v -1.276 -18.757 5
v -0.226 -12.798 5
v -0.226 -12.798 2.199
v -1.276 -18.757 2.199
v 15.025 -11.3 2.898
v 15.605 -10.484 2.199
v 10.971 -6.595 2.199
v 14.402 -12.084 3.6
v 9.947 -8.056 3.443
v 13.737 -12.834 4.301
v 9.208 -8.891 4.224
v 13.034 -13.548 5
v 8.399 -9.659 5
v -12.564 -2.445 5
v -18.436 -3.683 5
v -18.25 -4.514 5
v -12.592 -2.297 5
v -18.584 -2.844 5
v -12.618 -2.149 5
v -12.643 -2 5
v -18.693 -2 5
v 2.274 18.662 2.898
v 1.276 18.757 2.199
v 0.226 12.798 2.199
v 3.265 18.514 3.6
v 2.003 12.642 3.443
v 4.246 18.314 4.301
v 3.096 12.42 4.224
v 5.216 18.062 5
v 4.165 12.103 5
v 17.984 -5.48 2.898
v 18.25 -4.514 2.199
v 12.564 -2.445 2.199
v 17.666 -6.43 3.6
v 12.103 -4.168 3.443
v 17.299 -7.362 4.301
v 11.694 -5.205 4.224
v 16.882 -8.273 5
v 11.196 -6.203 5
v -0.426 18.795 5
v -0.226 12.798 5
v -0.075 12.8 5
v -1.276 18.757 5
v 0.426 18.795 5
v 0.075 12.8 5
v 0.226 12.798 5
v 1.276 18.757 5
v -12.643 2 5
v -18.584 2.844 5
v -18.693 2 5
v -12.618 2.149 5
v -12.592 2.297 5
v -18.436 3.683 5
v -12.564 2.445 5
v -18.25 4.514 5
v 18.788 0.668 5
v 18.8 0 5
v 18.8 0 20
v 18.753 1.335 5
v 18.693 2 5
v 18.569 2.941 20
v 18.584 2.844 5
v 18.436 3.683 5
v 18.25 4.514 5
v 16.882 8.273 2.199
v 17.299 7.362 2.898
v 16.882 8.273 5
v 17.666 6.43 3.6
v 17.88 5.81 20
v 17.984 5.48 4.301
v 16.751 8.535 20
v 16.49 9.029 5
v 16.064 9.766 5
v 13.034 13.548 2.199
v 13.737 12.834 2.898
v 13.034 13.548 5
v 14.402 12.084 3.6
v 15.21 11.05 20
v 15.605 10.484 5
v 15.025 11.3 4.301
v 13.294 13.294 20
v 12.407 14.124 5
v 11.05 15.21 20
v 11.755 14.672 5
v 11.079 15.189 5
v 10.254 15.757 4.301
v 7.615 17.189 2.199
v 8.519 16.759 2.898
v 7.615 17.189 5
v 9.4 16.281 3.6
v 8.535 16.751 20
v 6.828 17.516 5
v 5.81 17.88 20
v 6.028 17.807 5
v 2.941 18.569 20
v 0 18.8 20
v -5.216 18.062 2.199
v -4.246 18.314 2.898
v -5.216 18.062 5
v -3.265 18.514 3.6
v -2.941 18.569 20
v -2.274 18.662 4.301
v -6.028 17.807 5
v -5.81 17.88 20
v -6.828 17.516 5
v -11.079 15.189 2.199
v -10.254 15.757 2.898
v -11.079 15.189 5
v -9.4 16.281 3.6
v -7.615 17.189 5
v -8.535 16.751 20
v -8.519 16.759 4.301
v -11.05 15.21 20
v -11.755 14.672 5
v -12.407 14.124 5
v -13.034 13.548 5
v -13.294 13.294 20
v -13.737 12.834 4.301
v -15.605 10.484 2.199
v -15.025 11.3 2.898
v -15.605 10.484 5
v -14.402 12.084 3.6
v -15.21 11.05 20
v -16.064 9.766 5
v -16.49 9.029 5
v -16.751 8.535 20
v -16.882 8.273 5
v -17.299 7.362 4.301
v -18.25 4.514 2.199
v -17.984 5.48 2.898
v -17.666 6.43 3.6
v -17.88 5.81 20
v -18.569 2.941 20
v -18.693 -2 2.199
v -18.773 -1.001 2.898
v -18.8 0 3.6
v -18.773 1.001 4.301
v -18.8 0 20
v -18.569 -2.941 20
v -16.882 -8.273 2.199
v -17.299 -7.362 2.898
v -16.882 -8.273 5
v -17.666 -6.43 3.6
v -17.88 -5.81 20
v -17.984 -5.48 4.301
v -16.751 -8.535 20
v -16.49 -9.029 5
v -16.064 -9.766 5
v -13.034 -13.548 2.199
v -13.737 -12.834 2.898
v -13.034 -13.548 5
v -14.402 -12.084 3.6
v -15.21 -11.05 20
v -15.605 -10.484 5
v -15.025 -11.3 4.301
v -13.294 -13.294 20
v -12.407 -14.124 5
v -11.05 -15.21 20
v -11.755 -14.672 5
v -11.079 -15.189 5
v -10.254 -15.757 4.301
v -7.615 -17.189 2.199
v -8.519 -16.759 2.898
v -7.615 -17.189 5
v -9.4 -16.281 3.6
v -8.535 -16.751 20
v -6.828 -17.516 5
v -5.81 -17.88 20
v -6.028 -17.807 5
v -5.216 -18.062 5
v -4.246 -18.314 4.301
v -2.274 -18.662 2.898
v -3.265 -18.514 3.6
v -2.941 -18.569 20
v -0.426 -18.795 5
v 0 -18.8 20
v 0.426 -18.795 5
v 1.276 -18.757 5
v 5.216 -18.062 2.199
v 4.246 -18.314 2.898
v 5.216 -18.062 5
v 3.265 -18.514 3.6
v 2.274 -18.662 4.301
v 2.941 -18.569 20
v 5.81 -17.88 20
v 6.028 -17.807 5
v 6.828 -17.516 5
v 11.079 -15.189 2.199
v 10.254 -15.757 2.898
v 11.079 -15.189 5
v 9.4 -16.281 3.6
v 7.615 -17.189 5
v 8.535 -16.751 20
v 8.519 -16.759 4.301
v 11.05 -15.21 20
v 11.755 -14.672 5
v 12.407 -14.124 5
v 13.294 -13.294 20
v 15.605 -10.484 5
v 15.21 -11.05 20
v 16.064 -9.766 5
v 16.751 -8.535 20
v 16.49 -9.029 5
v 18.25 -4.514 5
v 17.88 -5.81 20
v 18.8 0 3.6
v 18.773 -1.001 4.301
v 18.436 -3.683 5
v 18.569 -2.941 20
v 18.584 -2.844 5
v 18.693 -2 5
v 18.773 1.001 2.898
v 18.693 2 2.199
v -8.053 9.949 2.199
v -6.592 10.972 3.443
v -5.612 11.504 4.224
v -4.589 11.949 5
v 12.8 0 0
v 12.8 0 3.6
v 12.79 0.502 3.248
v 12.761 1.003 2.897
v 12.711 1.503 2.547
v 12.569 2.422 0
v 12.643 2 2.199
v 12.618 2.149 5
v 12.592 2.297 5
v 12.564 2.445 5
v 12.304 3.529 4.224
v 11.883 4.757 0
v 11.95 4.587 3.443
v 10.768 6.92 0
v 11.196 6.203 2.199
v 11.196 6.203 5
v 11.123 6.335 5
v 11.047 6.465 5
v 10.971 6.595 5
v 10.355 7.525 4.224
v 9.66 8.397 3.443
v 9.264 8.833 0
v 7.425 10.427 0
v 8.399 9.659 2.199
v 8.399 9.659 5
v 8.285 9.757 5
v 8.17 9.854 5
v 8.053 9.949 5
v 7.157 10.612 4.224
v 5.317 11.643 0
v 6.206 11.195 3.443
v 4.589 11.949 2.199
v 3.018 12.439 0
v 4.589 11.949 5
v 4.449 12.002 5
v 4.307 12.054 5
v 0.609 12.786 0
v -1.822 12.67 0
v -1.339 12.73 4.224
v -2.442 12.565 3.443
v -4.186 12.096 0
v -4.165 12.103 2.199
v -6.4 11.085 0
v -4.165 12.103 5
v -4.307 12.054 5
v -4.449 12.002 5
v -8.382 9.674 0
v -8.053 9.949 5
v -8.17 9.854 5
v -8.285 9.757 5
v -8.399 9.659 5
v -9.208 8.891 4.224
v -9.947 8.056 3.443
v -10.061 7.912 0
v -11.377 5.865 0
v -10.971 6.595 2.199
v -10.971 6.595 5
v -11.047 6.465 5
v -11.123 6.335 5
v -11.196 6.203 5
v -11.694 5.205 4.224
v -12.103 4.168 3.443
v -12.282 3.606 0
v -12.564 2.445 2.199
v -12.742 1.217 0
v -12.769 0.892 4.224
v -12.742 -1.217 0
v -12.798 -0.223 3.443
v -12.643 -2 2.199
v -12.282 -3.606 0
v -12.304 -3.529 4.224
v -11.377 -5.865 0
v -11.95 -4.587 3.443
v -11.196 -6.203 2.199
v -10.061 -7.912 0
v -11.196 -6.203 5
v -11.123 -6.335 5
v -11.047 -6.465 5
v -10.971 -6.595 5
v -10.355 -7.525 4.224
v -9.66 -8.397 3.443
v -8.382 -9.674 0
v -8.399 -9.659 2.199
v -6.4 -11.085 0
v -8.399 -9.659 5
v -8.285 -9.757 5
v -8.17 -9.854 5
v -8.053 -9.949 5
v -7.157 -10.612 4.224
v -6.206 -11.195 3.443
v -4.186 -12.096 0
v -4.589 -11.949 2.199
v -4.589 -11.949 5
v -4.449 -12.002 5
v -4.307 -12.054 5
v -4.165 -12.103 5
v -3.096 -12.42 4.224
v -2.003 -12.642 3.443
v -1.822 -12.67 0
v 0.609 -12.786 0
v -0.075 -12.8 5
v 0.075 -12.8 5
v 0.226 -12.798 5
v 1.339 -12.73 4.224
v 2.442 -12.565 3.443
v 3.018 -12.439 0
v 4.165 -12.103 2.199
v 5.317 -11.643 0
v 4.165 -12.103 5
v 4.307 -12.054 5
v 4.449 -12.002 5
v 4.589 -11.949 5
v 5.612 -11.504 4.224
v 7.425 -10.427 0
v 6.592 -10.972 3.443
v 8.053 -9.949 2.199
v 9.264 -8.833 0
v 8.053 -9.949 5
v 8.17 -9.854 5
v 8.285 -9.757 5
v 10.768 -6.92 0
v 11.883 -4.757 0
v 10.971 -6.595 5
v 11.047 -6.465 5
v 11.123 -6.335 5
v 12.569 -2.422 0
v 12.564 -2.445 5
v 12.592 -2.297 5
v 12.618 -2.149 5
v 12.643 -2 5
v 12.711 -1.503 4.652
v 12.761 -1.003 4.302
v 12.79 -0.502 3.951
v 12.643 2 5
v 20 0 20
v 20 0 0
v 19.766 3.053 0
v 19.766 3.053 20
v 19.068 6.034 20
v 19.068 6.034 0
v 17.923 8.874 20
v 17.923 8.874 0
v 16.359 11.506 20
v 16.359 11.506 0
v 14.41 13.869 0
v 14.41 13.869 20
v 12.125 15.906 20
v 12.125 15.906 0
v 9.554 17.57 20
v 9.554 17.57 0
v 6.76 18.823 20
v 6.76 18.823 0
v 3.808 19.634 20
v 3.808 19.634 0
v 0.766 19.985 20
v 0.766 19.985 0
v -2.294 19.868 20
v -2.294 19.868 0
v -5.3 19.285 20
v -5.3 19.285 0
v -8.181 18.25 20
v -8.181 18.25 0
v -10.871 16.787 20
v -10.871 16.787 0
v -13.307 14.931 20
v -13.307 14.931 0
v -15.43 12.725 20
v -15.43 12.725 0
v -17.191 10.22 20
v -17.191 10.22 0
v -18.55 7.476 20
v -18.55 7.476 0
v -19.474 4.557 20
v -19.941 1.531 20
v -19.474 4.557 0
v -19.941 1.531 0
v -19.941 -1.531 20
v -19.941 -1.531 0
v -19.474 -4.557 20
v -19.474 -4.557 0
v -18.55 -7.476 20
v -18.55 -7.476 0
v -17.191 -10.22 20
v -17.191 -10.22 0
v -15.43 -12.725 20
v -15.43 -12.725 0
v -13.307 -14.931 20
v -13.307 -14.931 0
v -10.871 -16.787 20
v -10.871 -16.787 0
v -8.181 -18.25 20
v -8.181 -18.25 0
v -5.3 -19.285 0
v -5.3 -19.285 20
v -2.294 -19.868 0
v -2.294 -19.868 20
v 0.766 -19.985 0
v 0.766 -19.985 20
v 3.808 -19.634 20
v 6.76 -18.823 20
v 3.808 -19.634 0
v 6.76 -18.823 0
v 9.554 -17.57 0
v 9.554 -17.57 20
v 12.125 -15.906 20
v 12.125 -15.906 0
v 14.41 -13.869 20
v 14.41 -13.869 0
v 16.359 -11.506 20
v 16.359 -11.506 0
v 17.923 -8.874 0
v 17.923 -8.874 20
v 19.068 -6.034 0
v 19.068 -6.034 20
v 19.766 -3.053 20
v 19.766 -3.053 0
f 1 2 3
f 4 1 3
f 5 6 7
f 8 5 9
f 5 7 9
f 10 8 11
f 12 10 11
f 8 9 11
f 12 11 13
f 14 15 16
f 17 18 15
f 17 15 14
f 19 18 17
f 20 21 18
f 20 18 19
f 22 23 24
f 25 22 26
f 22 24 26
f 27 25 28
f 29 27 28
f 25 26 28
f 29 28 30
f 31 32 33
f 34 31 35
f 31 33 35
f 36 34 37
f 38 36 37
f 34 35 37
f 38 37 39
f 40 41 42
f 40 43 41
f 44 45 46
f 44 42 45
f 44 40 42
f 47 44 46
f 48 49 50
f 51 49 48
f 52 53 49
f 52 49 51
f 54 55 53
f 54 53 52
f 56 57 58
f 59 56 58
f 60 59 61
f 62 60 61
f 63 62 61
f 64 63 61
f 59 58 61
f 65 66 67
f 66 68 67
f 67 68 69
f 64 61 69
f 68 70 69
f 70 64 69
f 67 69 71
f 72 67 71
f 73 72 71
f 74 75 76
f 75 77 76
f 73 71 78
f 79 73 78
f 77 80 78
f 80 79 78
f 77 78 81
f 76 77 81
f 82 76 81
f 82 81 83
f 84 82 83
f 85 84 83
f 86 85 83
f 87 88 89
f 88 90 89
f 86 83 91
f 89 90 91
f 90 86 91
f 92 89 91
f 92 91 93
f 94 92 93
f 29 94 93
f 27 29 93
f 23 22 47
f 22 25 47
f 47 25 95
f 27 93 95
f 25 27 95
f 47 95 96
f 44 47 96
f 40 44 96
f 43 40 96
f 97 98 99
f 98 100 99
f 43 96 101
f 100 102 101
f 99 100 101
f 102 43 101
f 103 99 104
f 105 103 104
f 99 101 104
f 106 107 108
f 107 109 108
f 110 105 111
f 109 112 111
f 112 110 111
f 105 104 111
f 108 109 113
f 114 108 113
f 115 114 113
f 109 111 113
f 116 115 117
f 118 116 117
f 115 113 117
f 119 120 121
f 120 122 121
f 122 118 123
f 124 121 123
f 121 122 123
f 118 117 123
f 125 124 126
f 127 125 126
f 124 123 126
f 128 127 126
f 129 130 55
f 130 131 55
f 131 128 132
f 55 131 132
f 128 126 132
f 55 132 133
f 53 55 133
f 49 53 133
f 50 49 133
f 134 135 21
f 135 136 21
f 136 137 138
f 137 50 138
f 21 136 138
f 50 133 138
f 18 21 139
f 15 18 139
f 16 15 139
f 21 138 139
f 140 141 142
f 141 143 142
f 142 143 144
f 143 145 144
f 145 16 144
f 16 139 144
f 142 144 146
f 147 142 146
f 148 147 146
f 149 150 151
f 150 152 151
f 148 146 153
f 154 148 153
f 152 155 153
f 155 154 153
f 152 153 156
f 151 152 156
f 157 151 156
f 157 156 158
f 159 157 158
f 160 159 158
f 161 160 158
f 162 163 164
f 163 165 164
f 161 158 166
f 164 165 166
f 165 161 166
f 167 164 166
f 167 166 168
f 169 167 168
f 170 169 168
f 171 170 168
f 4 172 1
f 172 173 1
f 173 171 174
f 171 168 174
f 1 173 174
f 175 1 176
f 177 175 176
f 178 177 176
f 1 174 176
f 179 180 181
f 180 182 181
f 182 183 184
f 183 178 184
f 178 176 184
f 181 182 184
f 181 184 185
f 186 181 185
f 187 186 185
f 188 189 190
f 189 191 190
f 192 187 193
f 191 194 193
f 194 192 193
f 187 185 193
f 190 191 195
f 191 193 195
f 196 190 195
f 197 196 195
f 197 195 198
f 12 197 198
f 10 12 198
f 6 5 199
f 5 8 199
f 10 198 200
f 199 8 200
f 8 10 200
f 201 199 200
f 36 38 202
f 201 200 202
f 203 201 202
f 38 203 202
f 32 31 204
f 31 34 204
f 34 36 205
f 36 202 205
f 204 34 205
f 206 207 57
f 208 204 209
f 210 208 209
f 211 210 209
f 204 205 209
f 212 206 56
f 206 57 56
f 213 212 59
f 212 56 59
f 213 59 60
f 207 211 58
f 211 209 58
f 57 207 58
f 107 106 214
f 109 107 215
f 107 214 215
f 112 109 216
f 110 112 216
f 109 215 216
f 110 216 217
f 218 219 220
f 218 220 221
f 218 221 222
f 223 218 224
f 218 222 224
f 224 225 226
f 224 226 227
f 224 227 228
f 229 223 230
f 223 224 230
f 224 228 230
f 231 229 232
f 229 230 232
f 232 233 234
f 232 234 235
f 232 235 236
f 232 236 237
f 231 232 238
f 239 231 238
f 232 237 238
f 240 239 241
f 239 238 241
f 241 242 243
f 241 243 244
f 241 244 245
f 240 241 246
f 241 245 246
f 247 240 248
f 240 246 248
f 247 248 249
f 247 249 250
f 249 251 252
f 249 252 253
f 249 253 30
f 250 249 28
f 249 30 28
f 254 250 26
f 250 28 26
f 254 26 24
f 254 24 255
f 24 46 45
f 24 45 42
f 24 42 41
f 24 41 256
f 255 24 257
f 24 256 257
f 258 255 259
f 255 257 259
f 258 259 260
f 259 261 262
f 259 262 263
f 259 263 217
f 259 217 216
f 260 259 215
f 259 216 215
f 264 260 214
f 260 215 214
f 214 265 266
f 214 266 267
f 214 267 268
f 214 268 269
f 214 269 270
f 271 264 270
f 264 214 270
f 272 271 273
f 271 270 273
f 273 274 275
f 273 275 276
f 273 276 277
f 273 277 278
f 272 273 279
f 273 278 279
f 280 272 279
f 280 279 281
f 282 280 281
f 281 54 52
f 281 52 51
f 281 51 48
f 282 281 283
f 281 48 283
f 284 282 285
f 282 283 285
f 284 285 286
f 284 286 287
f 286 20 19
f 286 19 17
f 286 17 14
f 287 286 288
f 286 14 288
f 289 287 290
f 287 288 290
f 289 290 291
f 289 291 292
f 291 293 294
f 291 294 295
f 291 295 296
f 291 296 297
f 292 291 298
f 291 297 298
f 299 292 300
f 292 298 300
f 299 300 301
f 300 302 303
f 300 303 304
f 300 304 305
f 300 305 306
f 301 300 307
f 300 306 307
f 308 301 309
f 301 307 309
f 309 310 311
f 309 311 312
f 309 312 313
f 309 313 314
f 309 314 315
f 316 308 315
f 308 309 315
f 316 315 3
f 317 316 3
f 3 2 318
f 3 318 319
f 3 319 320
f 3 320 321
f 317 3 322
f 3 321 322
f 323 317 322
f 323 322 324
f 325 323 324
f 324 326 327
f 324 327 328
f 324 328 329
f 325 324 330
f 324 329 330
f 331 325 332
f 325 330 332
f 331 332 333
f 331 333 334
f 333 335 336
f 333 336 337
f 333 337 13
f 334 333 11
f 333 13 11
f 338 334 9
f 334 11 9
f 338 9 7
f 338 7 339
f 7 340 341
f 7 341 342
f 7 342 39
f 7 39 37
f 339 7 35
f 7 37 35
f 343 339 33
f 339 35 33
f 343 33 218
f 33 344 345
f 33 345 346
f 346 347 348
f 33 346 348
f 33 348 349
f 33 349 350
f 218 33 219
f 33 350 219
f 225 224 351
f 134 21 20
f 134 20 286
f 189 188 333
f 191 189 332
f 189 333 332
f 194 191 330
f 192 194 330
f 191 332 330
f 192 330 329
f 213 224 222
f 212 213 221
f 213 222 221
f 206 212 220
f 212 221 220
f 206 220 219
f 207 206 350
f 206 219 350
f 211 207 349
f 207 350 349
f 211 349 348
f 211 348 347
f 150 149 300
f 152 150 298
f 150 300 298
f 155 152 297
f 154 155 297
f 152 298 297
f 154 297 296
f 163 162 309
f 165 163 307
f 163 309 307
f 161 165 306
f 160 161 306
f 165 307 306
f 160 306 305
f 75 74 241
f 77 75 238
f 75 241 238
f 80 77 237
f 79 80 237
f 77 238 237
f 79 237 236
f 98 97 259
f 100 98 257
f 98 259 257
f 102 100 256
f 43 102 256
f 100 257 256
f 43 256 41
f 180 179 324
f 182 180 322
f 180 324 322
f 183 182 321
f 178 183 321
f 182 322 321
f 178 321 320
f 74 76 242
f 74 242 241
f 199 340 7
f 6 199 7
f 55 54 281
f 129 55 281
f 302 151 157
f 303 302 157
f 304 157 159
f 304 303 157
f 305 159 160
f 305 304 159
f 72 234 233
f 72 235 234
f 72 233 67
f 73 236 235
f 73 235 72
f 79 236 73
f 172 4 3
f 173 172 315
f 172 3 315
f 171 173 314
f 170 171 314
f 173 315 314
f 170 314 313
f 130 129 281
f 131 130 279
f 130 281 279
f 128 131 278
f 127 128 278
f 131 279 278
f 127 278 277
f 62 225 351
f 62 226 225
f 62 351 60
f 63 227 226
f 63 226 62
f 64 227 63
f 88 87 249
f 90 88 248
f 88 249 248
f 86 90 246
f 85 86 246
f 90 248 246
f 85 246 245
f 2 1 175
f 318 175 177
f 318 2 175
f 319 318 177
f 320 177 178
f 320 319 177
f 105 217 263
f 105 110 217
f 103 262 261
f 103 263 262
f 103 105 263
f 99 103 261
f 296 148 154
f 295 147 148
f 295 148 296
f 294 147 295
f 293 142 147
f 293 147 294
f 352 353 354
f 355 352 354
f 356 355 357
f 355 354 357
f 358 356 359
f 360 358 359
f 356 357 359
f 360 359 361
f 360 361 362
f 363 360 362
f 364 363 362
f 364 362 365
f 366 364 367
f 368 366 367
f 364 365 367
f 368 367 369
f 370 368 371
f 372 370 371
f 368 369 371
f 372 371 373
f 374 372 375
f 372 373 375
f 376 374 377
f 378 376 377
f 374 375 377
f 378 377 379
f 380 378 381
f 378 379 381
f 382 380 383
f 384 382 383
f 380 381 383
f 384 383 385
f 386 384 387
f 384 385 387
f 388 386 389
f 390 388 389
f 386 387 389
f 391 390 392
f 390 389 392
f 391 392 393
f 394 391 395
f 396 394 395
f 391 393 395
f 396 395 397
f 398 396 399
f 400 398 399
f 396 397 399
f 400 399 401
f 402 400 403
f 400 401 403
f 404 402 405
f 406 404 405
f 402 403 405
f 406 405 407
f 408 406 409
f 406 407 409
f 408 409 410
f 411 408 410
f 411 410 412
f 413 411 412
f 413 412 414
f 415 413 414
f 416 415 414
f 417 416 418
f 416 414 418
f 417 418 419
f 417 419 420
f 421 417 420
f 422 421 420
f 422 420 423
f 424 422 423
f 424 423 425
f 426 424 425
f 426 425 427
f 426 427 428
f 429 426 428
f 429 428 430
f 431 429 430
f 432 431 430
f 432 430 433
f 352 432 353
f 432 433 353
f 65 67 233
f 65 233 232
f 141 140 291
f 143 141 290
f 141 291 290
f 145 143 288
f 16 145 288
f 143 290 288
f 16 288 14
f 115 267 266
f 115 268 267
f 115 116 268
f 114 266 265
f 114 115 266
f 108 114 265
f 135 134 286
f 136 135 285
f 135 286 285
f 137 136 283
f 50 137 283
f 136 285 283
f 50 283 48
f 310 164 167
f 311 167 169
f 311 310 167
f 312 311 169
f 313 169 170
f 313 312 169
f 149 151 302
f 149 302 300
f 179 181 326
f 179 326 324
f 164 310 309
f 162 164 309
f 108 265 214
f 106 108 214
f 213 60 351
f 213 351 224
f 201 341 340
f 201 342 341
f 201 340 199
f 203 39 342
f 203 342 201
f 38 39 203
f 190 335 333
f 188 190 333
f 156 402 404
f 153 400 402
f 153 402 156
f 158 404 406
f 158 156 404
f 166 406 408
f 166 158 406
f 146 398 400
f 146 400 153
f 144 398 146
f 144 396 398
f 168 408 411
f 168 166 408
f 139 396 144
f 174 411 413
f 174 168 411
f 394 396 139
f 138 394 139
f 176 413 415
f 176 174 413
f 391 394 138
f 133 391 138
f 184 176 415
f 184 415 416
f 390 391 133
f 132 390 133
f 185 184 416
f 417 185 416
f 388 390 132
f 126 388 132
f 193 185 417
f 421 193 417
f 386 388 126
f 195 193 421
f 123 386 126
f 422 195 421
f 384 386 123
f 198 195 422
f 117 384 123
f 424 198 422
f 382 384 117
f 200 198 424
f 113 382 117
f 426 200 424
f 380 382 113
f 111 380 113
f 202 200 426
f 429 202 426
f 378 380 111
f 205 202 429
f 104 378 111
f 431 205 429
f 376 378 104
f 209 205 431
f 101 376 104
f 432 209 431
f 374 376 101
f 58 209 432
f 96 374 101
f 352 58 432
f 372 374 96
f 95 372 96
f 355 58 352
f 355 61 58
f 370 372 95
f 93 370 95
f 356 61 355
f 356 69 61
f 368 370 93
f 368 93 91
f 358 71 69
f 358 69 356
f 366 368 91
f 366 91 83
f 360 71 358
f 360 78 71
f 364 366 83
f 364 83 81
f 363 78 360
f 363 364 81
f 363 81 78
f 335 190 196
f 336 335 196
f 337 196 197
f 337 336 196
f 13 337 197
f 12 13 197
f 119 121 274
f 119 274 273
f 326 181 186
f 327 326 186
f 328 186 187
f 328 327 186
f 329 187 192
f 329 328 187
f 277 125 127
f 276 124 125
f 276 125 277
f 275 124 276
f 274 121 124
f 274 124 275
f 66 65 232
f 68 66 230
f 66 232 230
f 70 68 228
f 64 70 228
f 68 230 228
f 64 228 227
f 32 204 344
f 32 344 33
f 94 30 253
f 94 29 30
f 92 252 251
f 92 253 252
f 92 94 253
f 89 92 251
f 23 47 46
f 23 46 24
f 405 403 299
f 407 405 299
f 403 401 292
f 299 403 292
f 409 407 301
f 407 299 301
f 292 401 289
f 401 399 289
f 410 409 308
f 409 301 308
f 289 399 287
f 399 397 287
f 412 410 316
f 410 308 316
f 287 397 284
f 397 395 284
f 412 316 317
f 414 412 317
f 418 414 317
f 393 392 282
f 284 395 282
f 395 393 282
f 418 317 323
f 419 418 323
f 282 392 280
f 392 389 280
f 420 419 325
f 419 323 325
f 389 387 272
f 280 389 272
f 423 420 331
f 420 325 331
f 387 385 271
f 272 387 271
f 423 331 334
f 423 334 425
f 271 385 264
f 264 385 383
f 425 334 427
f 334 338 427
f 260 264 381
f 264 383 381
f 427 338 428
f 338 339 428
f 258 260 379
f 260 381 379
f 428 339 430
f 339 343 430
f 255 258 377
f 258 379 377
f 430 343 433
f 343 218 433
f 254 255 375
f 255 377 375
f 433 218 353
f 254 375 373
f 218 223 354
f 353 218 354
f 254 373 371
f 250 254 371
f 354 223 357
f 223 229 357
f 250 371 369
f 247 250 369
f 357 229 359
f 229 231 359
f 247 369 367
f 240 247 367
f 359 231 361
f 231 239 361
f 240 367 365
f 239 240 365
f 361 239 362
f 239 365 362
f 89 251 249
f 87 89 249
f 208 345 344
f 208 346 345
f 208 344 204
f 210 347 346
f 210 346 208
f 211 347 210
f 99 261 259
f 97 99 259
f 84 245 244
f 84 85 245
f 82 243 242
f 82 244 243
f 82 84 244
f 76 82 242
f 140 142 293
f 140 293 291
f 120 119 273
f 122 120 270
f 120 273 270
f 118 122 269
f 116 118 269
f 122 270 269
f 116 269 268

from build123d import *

# Parameters (mm, degrees)
F0_R            = 20
F1_DEPTH        = 20
F2_R            = 18.8
F3_DEPTH        = 15
F4_R            = 12.8
F5_DEPTH        = 25
F7_END_RADIUS   = 18.8
F7_REACH        = 24.884098355
F7_COPIES_COUNT = 18


# Not quite as in the source:
# - a pattern or mirror of a feature is missing from the dataset's text; its kind, count and spacing are read off the source's solid


with BuildPart() as f1:
    # F0 (on Top) → F1 (new body)
    with BuildSketch(Plane.XY):
        Circle(F0_R)
    extrude(amount=F1_DEPTH)

    # F2 (on face) → F3 (cut)
    with BuildSketch(Plane.XY.offset(20)):
        Circle(F2_R)
    extrude(amount=-F3_DEPTH, mode=Mode.SUBTRACT)

    # F4 (on face) → F5 (cut)
    with BuildSketch(Plane.XY.offset(5)):
        Circle(F4_R)
    extrude(amount=-F5_DEPTH, mode=Mode.SUBTRACT)

    f7_end = (Plane.XY.offset(12.5) * Cylinder(F7_END_RADIUS, 169.7681967101, mode=Mode.PRIVATE)).faces().sort_by_distance((-18.8, 0, 12.5))[0]
    # F6 (on Right) → F7 (cut, up to the whole of a round face its end follows)
    with BuildSketch(Plane.YZ):
        Polygon((-2, 5), (-2, 2.1991698472), (0, 3.5995849236), (2, 5), align=None)
    f7_long = extrude(amount=-F7_REACH, mode=Mode.PRIVATE)
    f7 = split(f7_long, bisect_by=f7_end, keep=Keep.BOTTOM, mode=Mode.PRIVATE)
    add(f7, mode=Mode.SUBTRACT)

    # F7_copies: F7 ×18 about axis
    f7_copies_axis = Axis((0, 0, 0), (0, 0, 1))
    for i in range(1, F7_COPIES_COUNT):
        add(f7.rotate(f7_copies_axis, i * 360 / F7_COPIES_COUNT), mode=Mode.SUBTRACT)


solid = f1.part
